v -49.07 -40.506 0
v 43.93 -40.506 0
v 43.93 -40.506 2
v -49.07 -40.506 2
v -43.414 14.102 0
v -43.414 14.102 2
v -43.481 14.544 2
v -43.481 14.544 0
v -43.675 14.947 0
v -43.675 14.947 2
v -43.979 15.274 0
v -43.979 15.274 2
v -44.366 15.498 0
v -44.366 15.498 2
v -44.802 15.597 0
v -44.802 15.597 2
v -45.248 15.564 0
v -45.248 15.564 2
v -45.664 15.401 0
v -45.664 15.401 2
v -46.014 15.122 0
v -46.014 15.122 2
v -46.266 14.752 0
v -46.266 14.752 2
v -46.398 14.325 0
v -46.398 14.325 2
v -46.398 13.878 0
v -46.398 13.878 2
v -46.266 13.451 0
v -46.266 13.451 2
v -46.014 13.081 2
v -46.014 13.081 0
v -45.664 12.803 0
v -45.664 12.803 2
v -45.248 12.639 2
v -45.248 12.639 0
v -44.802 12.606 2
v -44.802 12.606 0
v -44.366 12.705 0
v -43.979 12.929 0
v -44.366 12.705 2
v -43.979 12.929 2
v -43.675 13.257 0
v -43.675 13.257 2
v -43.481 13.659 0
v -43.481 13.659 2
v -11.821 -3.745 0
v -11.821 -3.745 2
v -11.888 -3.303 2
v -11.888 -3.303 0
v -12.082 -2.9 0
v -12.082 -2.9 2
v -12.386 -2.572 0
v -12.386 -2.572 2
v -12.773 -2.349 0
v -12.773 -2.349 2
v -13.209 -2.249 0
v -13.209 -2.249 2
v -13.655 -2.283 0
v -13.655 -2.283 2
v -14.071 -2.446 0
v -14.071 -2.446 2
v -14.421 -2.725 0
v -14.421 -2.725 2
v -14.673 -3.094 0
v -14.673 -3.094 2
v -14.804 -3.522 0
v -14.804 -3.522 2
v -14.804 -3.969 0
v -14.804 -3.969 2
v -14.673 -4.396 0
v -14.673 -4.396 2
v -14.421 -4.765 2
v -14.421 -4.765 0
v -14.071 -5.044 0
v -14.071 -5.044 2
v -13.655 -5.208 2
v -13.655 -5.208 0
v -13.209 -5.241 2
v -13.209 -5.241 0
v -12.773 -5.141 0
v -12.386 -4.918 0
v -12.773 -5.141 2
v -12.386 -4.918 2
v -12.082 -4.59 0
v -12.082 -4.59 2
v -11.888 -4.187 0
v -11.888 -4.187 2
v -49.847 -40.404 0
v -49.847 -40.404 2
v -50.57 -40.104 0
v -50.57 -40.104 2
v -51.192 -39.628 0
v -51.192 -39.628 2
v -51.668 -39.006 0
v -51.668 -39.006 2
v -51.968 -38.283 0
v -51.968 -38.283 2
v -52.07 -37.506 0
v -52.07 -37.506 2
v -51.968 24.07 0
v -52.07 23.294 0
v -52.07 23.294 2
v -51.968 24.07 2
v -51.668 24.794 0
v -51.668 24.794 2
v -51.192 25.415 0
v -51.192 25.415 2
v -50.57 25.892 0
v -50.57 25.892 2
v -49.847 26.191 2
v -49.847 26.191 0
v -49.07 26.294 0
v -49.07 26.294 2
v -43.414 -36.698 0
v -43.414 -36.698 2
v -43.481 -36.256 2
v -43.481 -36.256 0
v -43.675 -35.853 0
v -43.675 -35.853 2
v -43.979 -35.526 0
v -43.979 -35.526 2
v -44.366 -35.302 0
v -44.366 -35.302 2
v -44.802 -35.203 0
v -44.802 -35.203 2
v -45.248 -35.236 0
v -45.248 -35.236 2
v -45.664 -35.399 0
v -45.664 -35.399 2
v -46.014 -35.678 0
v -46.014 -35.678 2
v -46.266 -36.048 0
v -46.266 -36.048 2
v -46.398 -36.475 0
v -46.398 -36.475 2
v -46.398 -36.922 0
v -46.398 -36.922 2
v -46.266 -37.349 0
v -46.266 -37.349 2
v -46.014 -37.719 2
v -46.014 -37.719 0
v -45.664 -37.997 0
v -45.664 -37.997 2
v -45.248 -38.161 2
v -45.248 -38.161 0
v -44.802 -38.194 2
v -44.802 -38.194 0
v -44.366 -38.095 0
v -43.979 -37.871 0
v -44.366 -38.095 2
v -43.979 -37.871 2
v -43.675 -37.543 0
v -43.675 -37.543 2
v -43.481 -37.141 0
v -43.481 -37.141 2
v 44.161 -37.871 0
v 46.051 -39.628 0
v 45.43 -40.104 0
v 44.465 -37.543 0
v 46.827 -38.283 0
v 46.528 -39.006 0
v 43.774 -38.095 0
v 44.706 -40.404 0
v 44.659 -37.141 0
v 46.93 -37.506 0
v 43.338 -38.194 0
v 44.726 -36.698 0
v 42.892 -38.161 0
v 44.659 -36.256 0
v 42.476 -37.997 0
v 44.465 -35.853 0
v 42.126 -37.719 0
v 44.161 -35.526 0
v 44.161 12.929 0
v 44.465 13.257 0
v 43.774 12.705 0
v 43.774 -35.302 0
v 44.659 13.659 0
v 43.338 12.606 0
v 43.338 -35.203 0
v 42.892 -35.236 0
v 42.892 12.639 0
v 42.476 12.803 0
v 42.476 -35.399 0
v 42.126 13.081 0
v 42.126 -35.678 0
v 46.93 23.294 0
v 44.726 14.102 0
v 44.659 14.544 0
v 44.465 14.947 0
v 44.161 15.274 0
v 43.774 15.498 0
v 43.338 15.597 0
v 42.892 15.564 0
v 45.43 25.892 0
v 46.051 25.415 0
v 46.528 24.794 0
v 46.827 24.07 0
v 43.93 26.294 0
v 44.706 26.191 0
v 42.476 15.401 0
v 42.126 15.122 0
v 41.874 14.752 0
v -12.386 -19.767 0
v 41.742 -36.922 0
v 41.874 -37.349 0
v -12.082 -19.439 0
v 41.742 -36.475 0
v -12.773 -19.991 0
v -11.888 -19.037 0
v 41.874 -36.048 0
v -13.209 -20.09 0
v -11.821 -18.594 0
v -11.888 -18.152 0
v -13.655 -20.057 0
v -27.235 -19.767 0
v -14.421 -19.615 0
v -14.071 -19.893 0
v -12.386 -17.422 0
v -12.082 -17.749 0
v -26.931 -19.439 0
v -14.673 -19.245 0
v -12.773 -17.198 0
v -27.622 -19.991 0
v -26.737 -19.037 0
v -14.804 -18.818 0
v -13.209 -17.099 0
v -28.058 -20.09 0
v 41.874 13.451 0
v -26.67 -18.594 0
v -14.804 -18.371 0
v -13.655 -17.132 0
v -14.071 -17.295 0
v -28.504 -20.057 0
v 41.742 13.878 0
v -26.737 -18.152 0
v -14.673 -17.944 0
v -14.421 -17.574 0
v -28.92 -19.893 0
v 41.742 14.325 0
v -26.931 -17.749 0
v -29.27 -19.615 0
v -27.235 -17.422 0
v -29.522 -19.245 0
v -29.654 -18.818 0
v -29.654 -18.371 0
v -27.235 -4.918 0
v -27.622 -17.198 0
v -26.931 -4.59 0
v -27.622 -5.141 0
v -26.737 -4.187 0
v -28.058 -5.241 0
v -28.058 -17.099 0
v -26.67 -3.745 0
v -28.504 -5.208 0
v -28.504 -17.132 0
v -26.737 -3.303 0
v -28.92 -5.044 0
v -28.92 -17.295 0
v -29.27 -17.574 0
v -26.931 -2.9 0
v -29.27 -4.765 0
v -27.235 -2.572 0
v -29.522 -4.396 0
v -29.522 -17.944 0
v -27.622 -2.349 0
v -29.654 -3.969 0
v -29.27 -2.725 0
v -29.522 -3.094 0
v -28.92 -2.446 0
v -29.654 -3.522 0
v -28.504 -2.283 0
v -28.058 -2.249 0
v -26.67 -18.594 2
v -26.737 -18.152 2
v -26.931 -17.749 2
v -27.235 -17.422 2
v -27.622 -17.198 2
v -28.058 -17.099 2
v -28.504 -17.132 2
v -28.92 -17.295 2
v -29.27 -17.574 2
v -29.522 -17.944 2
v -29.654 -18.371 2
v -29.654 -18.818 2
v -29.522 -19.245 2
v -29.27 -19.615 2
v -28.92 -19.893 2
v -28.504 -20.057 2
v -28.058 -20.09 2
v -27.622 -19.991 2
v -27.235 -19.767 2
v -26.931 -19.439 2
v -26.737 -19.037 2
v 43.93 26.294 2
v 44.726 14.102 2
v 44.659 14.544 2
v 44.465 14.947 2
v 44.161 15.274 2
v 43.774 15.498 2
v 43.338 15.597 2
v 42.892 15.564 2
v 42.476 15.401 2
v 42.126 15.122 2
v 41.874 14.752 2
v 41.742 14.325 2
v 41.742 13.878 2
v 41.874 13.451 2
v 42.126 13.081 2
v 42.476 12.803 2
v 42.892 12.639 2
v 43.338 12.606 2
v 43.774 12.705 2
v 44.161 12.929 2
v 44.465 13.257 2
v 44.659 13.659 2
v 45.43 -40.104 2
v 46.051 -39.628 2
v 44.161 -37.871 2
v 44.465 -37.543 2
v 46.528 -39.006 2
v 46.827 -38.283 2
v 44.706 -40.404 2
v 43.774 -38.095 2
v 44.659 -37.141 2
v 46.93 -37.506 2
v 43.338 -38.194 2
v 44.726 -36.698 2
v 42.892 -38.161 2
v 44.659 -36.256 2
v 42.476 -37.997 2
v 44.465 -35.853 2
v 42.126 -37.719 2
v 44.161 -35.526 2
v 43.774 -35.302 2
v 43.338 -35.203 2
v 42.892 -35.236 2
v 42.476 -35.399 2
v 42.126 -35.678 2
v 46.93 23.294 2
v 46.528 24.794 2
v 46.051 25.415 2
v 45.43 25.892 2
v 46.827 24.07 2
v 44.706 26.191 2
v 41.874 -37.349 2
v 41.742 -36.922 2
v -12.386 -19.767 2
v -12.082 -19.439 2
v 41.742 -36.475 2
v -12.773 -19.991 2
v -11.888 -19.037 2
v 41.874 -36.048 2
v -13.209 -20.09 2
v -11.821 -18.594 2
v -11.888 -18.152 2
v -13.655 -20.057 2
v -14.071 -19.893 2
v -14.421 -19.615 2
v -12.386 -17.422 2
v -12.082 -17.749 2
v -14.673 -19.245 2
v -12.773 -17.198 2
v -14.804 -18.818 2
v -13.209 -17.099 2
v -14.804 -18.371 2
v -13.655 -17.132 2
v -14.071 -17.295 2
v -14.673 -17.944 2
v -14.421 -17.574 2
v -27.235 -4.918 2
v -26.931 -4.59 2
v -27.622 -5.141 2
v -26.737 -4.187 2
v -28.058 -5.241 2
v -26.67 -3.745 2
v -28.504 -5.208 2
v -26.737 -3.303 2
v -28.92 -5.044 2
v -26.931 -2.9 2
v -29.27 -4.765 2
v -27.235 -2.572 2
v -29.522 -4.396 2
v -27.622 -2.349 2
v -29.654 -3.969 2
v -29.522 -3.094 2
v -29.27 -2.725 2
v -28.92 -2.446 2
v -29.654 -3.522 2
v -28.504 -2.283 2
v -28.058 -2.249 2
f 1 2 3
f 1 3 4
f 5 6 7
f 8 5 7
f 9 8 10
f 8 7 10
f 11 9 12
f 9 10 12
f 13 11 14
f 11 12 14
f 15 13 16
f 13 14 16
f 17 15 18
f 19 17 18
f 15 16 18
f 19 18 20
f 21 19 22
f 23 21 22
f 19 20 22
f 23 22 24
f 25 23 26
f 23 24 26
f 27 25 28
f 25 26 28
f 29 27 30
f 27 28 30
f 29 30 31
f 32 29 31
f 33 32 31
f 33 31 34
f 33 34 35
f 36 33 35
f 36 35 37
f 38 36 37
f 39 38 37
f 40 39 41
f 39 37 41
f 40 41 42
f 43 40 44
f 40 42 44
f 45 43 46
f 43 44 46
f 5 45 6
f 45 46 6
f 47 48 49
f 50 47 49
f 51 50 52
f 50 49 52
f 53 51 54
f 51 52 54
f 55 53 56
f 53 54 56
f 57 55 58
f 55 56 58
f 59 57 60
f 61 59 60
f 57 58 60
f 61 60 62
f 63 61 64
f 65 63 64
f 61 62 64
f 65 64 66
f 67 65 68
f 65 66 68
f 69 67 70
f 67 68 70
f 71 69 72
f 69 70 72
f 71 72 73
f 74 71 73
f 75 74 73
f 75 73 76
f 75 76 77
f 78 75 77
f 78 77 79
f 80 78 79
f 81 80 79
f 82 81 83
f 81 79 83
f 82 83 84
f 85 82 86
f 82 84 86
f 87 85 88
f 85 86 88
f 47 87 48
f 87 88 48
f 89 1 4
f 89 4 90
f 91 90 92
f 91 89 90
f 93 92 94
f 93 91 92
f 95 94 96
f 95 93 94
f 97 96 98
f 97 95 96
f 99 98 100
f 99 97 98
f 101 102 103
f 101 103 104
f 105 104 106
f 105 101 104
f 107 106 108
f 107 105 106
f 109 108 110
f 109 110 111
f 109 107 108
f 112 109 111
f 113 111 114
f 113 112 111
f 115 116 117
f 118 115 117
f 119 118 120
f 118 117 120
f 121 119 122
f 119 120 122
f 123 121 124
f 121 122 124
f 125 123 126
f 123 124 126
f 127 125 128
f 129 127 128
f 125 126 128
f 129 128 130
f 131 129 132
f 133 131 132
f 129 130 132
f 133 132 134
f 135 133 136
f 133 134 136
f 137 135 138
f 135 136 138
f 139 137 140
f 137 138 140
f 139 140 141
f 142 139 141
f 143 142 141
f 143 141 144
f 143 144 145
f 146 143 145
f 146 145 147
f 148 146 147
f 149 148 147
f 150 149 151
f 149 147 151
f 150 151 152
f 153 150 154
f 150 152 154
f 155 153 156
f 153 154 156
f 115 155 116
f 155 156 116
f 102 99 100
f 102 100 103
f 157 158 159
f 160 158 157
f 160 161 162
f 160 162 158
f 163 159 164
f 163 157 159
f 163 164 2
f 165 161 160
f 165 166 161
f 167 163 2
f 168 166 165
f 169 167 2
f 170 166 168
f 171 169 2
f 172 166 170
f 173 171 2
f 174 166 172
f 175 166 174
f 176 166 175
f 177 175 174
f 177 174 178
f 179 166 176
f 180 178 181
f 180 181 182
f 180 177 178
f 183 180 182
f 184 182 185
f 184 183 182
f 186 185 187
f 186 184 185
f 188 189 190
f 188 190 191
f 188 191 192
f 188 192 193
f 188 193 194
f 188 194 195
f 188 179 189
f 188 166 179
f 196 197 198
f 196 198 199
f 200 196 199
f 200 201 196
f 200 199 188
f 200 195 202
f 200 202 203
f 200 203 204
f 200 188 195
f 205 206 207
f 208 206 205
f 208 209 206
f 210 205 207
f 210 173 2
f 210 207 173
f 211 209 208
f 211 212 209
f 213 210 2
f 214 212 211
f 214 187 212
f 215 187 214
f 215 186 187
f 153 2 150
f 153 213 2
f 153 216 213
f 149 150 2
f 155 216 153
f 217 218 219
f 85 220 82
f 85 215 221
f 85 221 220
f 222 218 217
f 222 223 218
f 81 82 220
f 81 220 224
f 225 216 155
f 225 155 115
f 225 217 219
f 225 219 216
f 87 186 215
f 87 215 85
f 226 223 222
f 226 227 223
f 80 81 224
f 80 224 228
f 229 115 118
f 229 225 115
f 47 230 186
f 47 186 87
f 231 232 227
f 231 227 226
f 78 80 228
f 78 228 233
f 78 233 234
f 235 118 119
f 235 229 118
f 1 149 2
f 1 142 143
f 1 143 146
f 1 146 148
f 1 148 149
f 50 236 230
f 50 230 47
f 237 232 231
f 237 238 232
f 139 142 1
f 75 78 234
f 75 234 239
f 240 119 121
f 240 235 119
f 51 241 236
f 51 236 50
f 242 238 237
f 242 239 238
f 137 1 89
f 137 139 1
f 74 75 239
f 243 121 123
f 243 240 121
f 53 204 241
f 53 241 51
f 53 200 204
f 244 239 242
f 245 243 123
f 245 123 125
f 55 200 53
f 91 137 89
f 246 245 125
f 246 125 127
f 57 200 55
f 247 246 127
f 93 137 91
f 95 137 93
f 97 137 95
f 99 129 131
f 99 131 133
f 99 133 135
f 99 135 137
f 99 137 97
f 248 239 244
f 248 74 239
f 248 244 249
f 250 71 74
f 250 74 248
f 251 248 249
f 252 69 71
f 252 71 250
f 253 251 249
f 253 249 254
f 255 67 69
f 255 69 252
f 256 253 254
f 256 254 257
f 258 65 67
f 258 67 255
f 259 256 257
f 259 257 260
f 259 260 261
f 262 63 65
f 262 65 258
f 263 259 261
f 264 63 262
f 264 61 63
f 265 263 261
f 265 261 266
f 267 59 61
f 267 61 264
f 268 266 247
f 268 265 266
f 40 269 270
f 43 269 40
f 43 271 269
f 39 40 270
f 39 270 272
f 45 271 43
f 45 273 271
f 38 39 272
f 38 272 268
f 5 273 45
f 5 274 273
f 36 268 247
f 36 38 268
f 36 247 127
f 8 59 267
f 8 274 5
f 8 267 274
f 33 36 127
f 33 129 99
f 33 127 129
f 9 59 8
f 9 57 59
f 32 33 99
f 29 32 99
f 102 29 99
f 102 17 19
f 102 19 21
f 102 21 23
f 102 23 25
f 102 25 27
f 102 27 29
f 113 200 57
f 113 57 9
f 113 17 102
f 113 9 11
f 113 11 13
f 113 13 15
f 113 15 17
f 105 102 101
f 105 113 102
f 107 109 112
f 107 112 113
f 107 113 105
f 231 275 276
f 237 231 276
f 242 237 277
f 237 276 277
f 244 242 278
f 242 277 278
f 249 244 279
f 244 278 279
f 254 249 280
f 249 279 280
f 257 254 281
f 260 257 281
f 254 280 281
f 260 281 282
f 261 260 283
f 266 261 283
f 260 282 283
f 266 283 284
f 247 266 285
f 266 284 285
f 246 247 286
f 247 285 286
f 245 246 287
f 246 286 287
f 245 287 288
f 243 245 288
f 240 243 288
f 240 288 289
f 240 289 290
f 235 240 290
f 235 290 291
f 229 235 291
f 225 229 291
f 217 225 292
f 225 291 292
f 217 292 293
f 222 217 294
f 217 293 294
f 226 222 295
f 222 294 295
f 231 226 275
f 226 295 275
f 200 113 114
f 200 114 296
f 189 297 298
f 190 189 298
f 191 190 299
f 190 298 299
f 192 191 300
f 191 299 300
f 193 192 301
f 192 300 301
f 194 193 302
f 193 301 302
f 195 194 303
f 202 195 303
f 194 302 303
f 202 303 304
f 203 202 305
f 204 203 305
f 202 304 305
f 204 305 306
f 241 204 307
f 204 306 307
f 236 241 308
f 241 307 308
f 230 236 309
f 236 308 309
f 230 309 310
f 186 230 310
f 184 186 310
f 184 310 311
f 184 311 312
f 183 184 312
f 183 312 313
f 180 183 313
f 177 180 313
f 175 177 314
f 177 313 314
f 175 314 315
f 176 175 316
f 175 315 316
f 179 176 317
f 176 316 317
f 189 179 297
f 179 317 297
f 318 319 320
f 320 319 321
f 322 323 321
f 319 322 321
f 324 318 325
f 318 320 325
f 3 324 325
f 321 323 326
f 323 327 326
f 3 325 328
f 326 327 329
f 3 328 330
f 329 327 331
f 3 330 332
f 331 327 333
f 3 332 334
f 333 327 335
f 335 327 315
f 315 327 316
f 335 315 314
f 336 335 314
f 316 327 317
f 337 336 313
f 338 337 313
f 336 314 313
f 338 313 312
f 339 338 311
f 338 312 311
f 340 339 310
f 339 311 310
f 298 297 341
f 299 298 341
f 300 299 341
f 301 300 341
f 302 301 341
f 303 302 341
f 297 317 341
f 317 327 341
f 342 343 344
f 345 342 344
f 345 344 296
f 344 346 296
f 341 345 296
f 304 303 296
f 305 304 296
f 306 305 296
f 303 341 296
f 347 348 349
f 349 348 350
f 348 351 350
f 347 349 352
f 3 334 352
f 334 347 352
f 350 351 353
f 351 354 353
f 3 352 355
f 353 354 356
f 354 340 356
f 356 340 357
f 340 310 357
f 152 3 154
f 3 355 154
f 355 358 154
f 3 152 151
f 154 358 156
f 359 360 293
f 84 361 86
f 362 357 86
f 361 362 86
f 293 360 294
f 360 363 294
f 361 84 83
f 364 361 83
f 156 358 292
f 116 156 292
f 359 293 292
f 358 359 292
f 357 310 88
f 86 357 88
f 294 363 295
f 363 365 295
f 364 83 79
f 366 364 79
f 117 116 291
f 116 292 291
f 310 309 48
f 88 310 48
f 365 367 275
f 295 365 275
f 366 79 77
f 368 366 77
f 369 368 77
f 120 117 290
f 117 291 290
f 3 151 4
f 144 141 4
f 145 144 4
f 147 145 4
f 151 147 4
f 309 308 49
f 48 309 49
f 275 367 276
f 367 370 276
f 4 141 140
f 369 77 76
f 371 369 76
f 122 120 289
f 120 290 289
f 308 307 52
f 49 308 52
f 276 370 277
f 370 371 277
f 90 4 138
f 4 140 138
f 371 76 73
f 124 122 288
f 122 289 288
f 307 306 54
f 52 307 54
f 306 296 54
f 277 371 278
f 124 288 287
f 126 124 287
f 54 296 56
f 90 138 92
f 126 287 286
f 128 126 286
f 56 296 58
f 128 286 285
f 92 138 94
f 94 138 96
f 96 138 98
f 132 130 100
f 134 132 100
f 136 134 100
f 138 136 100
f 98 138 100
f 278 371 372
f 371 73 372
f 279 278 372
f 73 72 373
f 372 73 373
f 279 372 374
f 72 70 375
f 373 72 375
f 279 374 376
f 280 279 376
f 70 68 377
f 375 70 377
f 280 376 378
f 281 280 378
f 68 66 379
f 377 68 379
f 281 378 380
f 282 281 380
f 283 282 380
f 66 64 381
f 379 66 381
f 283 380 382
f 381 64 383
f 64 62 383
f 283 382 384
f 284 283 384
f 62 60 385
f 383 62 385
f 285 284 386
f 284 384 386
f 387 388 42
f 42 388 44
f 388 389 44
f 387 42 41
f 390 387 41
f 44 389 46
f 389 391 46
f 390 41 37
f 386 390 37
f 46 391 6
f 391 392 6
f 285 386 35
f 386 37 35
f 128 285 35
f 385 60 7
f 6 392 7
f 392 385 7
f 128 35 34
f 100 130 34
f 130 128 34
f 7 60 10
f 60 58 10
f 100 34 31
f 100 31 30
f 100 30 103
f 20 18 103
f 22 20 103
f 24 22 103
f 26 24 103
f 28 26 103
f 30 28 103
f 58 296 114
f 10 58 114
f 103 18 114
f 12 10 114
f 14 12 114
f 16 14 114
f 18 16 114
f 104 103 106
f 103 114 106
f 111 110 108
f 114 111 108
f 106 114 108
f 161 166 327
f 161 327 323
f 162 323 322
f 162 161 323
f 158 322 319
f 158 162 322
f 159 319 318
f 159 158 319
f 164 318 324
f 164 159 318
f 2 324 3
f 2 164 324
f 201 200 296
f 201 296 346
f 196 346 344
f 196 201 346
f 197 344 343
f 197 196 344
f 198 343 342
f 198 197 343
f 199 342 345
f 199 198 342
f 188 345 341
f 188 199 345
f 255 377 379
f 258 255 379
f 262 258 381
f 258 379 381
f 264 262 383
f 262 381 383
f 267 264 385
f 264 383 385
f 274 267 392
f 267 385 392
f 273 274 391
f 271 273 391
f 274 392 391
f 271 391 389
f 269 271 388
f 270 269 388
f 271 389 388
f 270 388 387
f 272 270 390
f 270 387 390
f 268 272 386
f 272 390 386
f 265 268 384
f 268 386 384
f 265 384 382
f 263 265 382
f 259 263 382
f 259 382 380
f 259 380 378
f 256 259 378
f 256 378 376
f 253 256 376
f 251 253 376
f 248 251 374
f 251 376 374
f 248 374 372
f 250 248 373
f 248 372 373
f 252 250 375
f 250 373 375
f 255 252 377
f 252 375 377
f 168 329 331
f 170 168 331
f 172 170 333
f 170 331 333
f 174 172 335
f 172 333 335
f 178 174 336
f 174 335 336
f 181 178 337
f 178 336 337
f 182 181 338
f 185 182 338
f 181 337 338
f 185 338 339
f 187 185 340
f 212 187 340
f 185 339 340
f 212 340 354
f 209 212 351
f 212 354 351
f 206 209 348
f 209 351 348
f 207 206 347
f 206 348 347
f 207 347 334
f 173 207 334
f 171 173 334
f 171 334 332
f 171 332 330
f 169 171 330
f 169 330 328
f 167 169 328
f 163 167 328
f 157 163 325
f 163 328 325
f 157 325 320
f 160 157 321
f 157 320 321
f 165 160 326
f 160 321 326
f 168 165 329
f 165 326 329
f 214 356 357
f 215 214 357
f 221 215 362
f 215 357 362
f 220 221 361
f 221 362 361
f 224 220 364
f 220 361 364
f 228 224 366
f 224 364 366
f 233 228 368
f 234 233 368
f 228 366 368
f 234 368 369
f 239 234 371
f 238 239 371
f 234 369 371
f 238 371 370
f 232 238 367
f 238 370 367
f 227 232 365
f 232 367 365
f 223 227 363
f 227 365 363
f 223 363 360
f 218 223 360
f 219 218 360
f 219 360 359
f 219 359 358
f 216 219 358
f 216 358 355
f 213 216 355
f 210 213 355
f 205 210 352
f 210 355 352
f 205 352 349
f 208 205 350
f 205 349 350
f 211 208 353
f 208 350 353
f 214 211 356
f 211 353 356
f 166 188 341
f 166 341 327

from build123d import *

# Parameters (mm, degrees)
EXTRUDE_1_DEPTH     = 2
SKETCH_2_R          = 1.5
CUT_EXTRUDE_1_DEPTH = 2


with BuildPart() as part:
    # 草图1 → 凸台-拉伸1 (new body)
    with BuildSketch(Plane.XY):
        with BuildLine():
            Line((-49.07040619, 26.293617021), (43.92959381, 26.293617021))
            ThreePointArc((43.92959381, 26.293617021), (46.050914154, 25.414937365), (46.92959381, 23.293617021))
            Line((46.92959381, 23.293617021), (46.92959381, -37.506382979))
            ThreePointArc((46.92959381, -37.506382979), (46.050914154, -39.627703322), (43.92959381, -40.506382979))
            Line((43.92959381, -40.506382979), (-49.07040619, -40.506382979))
            ThreePointArc((-49.07040619, -40.506382979), (-51.191726533, -39.627703322), (-52.07040619, -37.506382979))
            Line((-52.07040619, -37.506382979), (-52.07040619, 23.293617021))
            ThreePointArc((-52.07040619, 23.293617021), (-51.191726533, 25.414937365), (-49.07040619, 26.293617021))
        make_face()
    extrude(amount=EXTRUDE_1_DEPTH)

    # 草图2 → 切除-拉伸1 (cut)
    with BuildSketch(Plane.XY.offset(2)):
        with Locations((-44.91440619, 14.101617021)):
            Circle(SKETCH_2_R)
        with Locations((43.22559381, 14.101617021)):
            Circle(SKETCH_2_R)
        with Locations((-44.91440619, -36.698382979)):
            Circle(SKETCH_2_R)
        with Locations((43.22559381, -36.698382979)):
            Circle(SKETCH_2_R)
        with Locations((-28.17040619, -3.745140574)):
            Circle(SKETCH_2_R)
        with Locations((-28.17040619, -18.594382979)):
            Circle(SKETCH_2_R)
        with Locations((-13.321163785, -3.745140574)):
            Circle(SKETCH_2_R)
        with Locations((-13.321163785, -18.594382979)):
            Circle(SKETCH_2_R)
    extrude(amount=-CUT_EXTRUDE_1_DEPTH, mode=Mode.SUBTRACT)


solid = part.part
